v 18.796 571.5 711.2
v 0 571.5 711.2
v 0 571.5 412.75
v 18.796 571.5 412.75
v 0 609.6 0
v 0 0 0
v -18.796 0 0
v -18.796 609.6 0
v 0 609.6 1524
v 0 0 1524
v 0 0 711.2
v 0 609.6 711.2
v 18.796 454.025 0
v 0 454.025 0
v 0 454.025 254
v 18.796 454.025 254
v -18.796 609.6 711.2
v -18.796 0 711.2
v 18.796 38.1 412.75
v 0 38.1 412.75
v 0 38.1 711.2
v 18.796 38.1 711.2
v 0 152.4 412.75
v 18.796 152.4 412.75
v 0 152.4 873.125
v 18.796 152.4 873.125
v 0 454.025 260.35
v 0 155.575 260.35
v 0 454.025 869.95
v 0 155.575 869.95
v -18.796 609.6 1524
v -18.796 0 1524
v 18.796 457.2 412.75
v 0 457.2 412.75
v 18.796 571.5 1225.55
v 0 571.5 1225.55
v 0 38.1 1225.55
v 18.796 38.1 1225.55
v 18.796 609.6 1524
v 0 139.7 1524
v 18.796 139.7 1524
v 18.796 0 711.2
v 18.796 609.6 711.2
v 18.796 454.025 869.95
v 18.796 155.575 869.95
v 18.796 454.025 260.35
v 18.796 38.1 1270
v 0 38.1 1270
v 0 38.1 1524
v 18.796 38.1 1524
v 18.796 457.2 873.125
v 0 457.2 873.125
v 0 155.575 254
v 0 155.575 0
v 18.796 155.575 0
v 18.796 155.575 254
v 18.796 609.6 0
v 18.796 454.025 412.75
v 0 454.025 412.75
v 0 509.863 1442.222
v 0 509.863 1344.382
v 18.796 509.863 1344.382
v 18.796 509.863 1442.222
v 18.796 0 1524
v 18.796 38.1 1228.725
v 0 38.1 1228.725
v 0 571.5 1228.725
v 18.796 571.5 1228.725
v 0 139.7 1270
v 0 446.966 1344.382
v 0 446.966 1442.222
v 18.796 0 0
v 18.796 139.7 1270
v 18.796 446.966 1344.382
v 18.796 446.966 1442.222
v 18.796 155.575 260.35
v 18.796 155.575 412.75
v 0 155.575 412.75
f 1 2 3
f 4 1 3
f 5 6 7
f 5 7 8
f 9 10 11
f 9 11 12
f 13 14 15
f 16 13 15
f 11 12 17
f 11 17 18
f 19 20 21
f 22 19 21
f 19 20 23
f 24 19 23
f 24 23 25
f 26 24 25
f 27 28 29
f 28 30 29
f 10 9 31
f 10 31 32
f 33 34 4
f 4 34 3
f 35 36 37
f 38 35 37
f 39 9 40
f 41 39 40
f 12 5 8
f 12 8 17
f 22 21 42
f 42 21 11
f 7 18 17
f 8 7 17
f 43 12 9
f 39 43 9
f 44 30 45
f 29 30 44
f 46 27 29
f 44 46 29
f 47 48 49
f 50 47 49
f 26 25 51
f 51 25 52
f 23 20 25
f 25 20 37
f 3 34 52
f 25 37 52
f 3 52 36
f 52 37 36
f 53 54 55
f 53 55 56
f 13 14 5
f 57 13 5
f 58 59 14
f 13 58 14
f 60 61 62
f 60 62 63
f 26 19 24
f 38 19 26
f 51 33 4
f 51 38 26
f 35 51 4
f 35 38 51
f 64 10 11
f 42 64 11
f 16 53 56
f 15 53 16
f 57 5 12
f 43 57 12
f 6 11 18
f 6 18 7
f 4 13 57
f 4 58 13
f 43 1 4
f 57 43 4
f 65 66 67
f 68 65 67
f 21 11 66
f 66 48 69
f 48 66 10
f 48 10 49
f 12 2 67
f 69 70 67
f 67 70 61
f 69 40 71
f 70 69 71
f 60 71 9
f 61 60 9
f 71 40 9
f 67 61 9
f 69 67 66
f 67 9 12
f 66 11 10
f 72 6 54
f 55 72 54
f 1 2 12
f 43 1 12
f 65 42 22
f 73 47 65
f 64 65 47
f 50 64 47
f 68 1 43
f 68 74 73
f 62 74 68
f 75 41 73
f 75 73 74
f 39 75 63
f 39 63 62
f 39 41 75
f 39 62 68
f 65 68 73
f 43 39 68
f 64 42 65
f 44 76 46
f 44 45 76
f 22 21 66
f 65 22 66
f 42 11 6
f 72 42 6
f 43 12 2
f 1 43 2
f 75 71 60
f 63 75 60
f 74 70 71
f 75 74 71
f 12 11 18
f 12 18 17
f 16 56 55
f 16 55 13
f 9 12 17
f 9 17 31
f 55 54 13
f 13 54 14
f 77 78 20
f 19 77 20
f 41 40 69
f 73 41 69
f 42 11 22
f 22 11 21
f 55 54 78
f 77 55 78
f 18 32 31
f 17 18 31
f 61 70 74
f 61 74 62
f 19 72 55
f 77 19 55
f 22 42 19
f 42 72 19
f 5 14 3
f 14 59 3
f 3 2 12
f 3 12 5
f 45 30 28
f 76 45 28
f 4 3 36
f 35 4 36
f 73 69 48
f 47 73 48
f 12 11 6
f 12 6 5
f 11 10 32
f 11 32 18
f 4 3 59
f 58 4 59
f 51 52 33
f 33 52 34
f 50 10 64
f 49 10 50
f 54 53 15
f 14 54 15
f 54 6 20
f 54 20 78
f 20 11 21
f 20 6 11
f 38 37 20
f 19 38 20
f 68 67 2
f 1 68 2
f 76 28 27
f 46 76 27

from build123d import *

# Parameters (mm, degrees)
F0_W     = 298.45
F0_H     = 254
F0_W_2   = 114.3
F0_H_2   = 298.45
F0_H_3   = 6.35
F0_W_3   = 3.175
F1_DEPTH = 18.796
F2_DEPTH = 18.796
F0_H_4   = 158.75
F0_W_4   = 60.5677366257
F0_H_5   = 55.9086799622
F3_DEPTH = 18.796
F0_W_5   = 62.8972649574
F0_H_6   = 97.8401899338
F0_W_6   = 38.1
F4_DEPTH = 18.796
F0_W_7   = 101.6
F5_DEPTH = 18.796


with BuildPart() as f1:
    # F0 (on Right) → F1 (new body)
    with BuildSketch(Plane.YZ):
        Polygon((0, 711.2), (0, 0), (155.575, 0), (155.575, 254), (155.575, 260.35), (155.575, 412.75), (152.4, 412.75), (38.1, 412.75), (38.1, 711.2), align=None)
        with Locations((304.8, 127)):
            Rectangle(F0_W, F0_H)
        Polygon((155.575, 412.75), (155.575, 260.35), (454.025, 260.35), (454.025, 412.75), (454.025, 711.2), (155.575, 711.2), align=None)
        with Locations((95.25, 561.975)):
            Rectangle(F0_W_2, F0_H_2)
        with Locations((304.8, 257.175)):
            Rectangle(F0_W, F0_H_3)
        Polygon((454.025, 254), (454.025, 0), (609.6, 0), (609.6, 711.2), (571.5, 711.2), (571.5, 412.75), (457.2, 412.75), (454.025, 412.75), (454.025, 260.35), align=None)
        with Locations((514.35, 561.975)):
            Rectangle(F0_W_2, F0_H_2)
        with Locations((455.6125, 561.975)):
            Rectangle(F0_W_3, F0_H_2)
        with Locations((153.9875, 561.975)):
            Rectangle(F0_W_3, F0_H_2)
    extrude(amount=-F1_DEPTH)


with BuildPart() as f2:
    # F0 (on Right) → F2 (new body)
    with BuildSketch(Plane.YZ):
        with Locations((304.8, 127)):
            Rectangle(F0_W, F0_H)
    extrude(amount=F2_DEPTH)


with BuildPart() as f2b:
    # F0 (on Right) → F2, piece 2 (new body)
    with BuildSketch(Plane.YZ):
        Polygon((155.575, 412.75), (155.575, 260.35), (454.025, 260.35), (454.025, 412.75), (454.025, 711.2), (155.575, 711.2), align=None)
        with Locations((304.8, 790.575)):
            Rectangle(F0_W, F0_H_4)
    extrude(amount=F2_DEPTH)


with BuildPart() as f2c:
    # F0 (on Right) → F2, piece 3 (new body)
    with BuildSketch(Plane.YZ):
        Polygon((38.1, 1225.55), (38.1, 711.2), (152.4, 711.2), (152.4, 873.125), (457.2, 873.125), (457.2, 711.2), (571.5, 711.2), (571.5, 1225.55), (463.882438755, 1225.55), (463.882438755, 1169.6413200378), (403.3147021294, 1169.6413200378), (403.3147021294, 1225.55), (206.2852978706, 1225.55), (206.2852978706, 1169.6413200378), (145.717561245, 1169.6413200378), (145.717561245, 1225.55), align=None)
        with Locations((514.35, 561.975)):
            Rectangle(F0_W_2, F0_H_2)
        with Locations((95.25, 561.975)):
            Rectangle(F0_W_2, F0_H_2)
        with Locations((176.0014295578, 1197.5956600189)):
            Rectangle(F0_W_4, F0_H_5)
        with Locations((433.5985704422, 1197.5956600189)):
            Rectangle(F0_W_4, F0_H_5)
    extrude(amount=F2_DEPTH)


with BuildPart() as f3:
    # F0 (on Right) → F3 (new body)
    with BuildSketch(Plane.YZ):
        Polygon((454.025, 254), (454.025, 0), (609.6, 0), (609.6, 711.2), (571.5, 711.2), (571.5, 412.75), (457.2, 412.75), (454.025, 412.75), (454.025, 260.35), align=None)
    extrude(amount=F3_DEPTH)


with BuildPart() as f3b:
    # F0 (on Right) → F3, piece 2 (new body)
    with BuildSketch(Plane.YZ):
        Polygon((0, 711.2), (0, 0), (155.575, 0), (155.575, 254), (155.575, 260.35), (155.575, 412.75), (152.4, 412.75), (38.1, 412.75), (38.1, 711.2), align=None)
    extrude(amount=F3_DEPTH)


with BuildPart() as f4:
    # F0 (on Right) → F4 (new body)
    with BuildSketch(Plane.YZ):
        Polygon((0, 1270), (0, 711.2), (38.1, 711.2), (38.1, 1225.55), (38.1, 1228.725), (571.5, 1228.725), (571.5, 1225.55), (571.5, 711.2), (609.6, 711.2), (609.6, 1524), (139.7, 1524), (139.7, 1270), (38.1, 1270), align=None)
        with Locations((478.4143269062, 1393.3022618294)):
            Rectangle(F0_W_5, F0_H_6, mode=Mode.SUBTRACT)
        with Locations((19.05, 1397)):
            Rectangle(F0_W_6, F0_H)
    extrude(amount=F4_DEPTH)


with BuildPart() as f5:
    # F0 (on Right) → F5 (new body)
    with BuildSketch(Plane.YZ):
        Polygon((38.1, 1225.55), (38.1, 711.2), (152.4, 711.2), (152.4, 873.125), (457.2, 873.125), (457.2, 711.2), (571.5, 711.2), (571.5, 1225.55), (463.882438755, 1225.55), (463.882438755, 1169.6413200378), (403.3147021294, 1169.6413200378), (403.3147021294, 1225.55), (206.2852978706, 1225.55), (206.2852978706, 1169.6413200378), (145.717561245, 1169.6413200378), (145.717561245, 1225.55), align=None)
        Polygon((0, 1270), (0, 711.2), (38.1, 711.2), (38.1, 1225.55), (38.1, 1228.725), (571.5, 1228.725), (571.5, 1225.55), (571.5, 711.2), (609.6, 711.2), (609.6, 1524), (139.7, 1524), (139.7, 1270), (38.1, 1270), align=None)
        with Locations((478.4143269062, 1393.3022618294)):
            Rectangle(F0_W_5, F0_H_6, mode=Mode.SUBTRACT)
        with Locations((304.8, 790.575)):
            Rectangle(F0_W, F0_H_4)
        with Locations((88.9, 1397)):
            Rectangle(F0_W_7, F0_H)
        with Locations((19.05, 1397)):
            Rectangle(F0_W_6, F0_H)
        with Locations((478.4143269062, 1393.3022618294)):
            Rectangle(F0_W_5, F0_H_6)
        with Locations((433.5985704422, 1197.5956600189)):
            Rectangle(F0_W_4, F0_H_5)
        with Locations((176.0014295578, 1197.5956600189)):
            Rectangle(F0_W_4, F0_H_5)
        Polygon((152.4, 873.125), (152.4, 711.2), (155.575, 711.2), (155.575, 869.95), (454.025, 869.95), (454.025, 711.2), (457.2, 711.2), (457.2, 873.125), align=None)
        Polygon((38.1, 1228.725), (38.1, 1225.55), (145.717561245, 1225.55), (206.2852978706, 1225.55), (403.3147021294, 1225.55), (463.882438755, 1225.55), (571.5, 1225.55), (571.5, 1228.725), align=None)
    extrude(amount=-F5_DEPTH)


solid = Compound([f1.part, f2.part, f2b.part, f2c.part, f3.part, f3b.part, f4.part, f5.part])
